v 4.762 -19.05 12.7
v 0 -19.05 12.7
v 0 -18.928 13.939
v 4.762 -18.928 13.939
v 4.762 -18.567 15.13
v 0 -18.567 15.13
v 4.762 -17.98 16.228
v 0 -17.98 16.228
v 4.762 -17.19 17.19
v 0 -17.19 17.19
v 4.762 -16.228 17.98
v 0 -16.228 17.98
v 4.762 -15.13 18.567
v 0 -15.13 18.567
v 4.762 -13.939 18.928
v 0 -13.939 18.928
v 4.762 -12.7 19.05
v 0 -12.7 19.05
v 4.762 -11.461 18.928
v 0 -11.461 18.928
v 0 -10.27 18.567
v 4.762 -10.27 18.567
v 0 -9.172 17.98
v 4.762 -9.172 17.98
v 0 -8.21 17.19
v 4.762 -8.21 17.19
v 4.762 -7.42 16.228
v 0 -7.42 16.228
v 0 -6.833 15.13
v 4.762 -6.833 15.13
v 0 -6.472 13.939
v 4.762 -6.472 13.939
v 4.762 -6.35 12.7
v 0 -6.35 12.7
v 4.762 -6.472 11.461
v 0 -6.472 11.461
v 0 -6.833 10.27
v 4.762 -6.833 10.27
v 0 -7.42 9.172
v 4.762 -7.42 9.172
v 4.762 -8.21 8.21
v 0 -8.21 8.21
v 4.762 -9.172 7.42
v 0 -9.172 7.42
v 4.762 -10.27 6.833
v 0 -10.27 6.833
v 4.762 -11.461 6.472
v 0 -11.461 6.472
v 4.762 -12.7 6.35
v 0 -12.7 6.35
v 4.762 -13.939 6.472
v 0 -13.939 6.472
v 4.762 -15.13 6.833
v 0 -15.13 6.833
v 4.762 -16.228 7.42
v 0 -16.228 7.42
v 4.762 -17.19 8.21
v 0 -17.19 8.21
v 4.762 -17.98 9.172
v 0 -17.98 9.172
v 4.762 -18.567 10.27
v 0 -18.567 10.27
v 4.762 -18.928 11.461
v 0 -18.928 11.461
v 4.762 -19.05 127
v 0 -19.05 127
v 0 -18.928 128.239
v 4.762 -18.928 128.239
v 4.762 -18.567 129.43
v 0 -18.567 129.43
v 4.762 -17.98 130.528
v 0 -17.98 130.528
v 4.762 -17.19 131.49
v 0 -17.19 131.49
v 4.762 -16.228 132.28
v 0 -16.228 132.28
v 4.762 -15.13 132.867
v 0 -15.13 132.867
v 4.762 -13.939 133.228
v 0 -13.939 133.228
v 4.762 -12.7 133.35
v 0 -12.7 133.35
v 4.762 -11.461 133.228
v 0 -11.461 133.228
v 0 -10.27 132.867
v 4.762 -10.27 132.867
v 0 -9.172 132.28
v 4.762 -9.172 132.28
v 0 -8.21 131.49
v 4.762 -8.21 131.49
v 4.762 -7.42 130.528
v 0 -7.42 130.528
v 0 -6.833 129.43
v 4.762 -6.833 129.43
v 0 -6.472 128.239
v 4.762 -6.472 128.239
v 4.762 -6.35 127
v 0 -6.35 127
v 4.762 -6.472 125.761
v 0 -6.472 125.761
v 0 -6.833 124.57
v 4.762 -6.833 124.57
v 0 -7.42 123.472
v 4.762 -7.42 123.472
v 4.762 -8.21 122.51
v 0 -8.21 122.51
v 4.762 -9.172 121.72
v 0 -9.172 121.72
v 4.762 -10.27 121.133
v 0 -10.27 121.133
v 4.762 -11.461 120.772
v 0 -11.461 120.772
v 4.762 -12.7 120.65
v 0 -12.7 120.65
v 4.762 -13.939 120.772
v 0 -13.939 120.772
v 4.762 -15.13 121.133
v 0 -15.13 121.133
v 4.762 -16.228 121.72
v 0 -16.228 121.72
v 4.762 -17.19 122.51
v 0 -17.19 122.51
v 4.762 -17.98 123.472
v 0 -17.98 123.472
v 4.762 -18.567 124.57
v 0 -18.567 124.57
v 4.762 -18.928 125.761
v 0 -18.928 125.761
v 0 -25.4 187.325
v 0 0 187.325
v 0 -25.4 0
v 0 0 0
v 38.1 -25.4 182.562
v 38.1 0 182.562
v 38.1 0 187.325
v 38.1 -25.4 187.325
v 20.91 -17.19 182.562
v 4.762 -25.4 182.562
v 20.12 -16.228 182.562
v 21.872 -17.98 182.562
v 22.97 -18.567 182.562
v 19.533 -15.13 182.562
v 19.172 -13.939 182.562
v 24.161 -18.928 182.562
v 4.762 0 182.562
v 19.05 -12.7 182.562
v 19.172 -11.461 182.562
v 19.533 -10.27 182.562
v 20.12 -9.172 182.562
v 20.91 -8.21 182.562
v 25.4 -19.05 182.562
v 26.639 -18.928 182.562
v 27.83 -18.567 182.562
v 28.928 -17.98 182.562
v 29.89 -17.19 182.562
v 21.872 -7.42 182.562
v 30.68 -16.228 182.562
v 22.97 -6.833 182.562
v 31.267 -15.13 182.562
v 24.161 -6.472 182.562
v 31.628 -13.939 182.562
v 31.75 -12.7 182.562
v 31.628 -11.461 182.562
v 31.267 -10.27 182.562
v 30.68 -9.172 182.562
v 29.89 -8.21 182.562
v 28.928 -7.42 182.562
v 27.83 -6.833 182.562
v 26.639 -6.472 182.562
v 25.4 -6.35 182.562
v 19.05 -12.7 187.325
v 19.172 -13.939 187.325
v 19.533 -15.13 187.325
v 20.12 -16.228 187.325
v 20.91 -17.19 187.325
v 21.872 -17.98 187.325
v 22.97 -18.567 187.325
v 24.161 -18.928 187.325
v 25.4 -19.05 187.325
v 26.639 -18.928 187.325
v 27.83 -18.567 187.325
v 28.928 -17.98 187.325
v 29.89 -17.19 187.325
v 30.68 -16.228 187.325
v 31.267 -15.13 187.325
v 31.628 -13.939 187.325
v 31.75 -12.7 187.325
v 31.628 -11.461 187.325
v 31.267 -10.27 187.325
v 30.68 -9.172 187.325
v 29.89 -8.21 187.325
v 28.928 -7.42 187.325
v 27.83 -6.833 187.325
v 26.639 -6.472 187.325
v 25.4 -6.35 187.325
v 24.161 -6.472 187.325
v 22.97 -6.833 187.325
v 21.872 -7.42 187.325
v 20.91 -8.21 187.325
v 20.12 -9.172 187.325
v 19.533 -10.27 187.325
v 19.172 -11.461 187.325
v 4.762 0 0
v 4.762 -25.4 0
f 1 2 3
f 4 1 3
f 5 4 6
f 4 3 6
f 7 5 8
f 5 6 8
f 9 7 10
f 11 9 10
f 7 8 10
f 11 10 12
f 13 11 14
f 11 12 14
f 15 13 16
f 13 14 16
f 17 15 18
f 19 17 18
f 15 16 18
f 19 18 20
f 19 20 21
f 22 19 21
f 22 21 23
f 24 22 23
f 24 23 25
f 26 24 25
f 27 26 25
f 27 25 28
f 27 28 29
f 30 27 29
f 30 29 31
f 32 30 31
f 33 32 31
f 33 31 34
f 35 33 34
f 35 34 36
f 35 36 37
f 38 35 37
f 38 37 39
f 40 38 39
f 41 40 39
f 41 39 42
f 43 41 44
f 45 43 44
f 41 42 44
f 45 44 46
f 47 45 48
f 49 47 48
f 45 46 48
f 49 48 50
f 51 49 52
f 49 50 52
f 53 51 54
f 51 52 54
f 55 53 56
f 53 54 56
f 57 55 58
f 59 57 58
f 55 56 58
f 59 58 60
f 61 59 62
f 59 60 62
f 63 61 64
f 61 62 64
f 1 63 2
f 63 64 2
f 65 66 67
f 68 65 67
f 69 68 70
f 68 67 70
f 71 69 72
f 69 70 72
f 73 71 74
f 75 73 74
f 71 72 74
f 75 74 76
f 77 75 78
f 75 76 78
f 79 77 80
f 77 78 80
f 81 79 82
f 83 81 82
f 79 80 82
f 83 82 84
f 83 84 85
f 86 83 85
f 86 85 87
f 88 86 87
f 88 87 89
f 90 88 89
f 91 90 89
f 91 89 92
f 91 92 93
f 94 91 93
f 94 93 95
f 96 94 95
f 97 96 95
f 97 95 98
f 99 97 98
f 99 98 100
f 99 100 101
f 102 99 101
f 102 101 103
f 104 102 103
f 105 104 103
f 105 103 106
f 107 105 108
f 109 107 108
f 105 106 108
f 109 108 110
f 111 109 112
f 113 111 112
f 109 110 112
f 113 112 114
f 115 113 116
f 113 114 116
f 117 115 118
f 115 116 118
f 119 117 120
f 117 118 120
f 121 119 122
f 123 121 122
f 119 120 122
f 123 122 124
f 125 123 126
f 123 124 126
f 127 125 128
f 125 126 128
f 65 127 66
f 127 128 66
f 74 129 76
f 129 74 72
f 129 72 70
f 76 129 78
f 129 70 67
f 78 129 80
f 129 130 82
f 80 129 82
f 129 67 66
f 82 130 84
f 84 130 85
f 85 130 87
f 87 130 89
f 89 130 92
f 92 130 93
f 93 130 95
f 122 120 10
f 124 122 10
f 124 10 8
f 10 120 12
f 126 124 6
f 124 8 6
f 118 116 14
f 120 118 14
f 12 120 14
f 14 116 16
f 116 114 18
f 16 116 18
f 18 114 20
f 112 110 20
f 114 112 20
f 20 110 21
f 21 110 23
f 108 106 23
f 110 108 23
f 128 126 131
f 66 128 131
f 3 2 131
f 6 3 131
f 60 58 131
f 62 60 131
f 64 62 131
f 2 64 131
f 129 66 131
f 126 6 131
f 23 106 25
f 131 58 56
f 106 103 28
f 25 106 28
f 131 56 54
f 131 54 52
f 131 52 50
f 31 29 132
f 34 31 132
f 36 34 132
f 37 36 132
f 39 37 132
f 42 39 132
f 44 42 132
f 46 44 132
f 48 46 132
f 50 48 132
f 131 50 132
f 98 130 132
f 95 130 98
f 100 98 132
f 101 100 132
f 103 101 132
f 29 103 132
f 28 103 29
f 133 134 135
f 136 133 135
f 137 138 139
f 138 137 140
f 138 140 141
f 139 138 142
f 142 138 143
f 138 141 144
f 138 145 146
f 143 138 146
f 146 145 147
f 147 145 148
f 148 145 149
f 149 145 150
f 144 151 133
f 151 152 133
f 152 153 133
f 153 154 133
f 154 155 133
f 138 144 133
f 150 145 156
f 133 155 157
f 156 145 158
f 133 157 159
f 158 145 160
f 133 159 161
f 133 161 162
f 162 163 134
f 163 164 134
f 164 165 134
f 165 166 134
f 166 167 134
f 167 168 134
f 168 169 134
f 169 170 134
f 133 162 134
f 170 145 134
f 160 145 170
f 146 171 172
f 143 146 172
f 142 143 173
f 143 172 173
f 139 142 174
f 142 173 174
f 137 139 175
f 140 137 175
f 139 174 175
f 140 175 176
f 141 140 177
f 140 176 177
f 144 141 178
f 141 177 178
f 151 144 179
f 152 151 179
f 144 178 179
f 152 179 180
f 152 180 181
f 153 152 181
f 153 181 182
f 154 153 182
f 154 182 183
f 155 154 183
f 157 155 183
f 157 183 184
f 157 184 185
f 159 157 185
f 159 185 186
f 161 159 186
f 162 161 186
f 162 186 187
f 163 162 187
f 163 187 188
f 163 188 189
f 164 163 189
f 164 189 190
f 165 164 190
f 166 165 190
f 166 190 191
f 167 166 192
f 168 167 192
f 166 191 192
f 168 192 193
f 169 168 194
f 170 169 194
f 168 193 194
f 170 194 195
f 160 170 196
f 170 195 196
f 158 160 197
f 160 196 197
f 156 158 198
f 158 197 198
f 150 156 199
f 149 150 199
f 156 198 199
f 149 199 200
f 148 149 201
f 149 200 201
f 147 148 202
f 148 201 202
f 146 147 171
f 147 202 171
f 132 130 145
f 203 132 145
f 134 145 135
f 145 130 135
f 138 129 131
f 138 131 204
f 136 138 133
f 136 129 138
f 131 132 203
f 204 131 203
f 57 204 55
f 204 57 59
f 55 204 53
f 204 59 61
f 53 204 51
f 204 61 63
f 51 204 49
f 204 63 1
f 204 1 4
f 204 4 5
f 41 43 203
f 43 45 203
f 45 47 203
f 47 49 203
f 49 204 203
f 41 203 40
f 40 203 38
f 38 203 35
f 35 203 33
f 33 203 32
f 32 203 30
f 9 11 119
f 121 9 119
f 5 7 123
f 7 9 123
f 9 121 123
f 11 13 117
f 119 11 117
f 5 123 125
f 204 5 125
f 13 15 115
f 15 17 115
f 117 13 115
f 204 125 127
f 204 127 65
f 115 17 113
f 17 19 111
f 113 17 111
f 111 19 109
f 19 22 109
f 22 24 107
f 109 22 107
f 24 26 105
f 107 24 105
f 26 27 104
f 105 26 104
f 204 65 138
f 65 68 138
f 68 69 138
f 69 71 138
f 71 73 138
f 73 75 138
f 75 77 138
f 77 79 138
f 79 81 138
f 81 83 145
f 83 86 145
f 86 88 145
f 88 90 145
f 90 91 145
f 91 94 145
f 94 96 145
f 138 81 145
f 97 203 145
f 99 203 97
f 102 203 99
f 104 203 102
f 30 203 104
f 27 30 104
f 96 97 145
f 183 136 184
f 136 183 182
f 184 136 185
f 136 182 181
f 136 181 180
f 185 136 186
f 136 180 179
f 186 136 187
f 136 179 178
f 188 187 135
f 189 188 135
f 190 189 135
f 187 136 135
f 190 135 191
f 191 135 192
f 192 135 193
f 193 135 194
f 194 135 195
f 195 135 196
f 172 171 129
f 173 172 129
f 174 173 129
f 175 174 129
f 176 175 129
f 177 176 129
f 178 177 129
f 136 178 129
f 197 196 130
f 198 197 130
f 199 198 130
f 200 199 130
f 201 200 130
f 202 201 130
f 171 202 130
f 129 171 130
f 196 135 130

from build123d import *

# Parameters (mm, degrees)
F1_DEPTH = 25.4
F3_D     = 12.7
F5_D     = 12.7


with BuildPart() as f1:
    # F0 (on Front) → F1 (new body)
    with BuildSketch(Plane.XZ):
        Polygon((0, 187.325), (0, 0), (4.7625, 0), (4.7625, 182.5625), (38.1, 182.5625), (38.1, 187.325), align=None)
    extrude(amount=F1_DEPTH)

    # F3 (through all)
    with Locations(Plane.YZ.offset(4.7625)):
        with Locations((-12.7, 127), (-12.7, 12.7)):
            Hole(F3_D / 2)

    # F5 (through all)
    with Locations(Plane(origin=(0, 0, 182.5625), x_dir=(1, 0, 0), z_dir=(0, 0, -1))):
        with Locations((25.4, 12.7)):
            Hole(F5_D / 2)


solid = f1.part
